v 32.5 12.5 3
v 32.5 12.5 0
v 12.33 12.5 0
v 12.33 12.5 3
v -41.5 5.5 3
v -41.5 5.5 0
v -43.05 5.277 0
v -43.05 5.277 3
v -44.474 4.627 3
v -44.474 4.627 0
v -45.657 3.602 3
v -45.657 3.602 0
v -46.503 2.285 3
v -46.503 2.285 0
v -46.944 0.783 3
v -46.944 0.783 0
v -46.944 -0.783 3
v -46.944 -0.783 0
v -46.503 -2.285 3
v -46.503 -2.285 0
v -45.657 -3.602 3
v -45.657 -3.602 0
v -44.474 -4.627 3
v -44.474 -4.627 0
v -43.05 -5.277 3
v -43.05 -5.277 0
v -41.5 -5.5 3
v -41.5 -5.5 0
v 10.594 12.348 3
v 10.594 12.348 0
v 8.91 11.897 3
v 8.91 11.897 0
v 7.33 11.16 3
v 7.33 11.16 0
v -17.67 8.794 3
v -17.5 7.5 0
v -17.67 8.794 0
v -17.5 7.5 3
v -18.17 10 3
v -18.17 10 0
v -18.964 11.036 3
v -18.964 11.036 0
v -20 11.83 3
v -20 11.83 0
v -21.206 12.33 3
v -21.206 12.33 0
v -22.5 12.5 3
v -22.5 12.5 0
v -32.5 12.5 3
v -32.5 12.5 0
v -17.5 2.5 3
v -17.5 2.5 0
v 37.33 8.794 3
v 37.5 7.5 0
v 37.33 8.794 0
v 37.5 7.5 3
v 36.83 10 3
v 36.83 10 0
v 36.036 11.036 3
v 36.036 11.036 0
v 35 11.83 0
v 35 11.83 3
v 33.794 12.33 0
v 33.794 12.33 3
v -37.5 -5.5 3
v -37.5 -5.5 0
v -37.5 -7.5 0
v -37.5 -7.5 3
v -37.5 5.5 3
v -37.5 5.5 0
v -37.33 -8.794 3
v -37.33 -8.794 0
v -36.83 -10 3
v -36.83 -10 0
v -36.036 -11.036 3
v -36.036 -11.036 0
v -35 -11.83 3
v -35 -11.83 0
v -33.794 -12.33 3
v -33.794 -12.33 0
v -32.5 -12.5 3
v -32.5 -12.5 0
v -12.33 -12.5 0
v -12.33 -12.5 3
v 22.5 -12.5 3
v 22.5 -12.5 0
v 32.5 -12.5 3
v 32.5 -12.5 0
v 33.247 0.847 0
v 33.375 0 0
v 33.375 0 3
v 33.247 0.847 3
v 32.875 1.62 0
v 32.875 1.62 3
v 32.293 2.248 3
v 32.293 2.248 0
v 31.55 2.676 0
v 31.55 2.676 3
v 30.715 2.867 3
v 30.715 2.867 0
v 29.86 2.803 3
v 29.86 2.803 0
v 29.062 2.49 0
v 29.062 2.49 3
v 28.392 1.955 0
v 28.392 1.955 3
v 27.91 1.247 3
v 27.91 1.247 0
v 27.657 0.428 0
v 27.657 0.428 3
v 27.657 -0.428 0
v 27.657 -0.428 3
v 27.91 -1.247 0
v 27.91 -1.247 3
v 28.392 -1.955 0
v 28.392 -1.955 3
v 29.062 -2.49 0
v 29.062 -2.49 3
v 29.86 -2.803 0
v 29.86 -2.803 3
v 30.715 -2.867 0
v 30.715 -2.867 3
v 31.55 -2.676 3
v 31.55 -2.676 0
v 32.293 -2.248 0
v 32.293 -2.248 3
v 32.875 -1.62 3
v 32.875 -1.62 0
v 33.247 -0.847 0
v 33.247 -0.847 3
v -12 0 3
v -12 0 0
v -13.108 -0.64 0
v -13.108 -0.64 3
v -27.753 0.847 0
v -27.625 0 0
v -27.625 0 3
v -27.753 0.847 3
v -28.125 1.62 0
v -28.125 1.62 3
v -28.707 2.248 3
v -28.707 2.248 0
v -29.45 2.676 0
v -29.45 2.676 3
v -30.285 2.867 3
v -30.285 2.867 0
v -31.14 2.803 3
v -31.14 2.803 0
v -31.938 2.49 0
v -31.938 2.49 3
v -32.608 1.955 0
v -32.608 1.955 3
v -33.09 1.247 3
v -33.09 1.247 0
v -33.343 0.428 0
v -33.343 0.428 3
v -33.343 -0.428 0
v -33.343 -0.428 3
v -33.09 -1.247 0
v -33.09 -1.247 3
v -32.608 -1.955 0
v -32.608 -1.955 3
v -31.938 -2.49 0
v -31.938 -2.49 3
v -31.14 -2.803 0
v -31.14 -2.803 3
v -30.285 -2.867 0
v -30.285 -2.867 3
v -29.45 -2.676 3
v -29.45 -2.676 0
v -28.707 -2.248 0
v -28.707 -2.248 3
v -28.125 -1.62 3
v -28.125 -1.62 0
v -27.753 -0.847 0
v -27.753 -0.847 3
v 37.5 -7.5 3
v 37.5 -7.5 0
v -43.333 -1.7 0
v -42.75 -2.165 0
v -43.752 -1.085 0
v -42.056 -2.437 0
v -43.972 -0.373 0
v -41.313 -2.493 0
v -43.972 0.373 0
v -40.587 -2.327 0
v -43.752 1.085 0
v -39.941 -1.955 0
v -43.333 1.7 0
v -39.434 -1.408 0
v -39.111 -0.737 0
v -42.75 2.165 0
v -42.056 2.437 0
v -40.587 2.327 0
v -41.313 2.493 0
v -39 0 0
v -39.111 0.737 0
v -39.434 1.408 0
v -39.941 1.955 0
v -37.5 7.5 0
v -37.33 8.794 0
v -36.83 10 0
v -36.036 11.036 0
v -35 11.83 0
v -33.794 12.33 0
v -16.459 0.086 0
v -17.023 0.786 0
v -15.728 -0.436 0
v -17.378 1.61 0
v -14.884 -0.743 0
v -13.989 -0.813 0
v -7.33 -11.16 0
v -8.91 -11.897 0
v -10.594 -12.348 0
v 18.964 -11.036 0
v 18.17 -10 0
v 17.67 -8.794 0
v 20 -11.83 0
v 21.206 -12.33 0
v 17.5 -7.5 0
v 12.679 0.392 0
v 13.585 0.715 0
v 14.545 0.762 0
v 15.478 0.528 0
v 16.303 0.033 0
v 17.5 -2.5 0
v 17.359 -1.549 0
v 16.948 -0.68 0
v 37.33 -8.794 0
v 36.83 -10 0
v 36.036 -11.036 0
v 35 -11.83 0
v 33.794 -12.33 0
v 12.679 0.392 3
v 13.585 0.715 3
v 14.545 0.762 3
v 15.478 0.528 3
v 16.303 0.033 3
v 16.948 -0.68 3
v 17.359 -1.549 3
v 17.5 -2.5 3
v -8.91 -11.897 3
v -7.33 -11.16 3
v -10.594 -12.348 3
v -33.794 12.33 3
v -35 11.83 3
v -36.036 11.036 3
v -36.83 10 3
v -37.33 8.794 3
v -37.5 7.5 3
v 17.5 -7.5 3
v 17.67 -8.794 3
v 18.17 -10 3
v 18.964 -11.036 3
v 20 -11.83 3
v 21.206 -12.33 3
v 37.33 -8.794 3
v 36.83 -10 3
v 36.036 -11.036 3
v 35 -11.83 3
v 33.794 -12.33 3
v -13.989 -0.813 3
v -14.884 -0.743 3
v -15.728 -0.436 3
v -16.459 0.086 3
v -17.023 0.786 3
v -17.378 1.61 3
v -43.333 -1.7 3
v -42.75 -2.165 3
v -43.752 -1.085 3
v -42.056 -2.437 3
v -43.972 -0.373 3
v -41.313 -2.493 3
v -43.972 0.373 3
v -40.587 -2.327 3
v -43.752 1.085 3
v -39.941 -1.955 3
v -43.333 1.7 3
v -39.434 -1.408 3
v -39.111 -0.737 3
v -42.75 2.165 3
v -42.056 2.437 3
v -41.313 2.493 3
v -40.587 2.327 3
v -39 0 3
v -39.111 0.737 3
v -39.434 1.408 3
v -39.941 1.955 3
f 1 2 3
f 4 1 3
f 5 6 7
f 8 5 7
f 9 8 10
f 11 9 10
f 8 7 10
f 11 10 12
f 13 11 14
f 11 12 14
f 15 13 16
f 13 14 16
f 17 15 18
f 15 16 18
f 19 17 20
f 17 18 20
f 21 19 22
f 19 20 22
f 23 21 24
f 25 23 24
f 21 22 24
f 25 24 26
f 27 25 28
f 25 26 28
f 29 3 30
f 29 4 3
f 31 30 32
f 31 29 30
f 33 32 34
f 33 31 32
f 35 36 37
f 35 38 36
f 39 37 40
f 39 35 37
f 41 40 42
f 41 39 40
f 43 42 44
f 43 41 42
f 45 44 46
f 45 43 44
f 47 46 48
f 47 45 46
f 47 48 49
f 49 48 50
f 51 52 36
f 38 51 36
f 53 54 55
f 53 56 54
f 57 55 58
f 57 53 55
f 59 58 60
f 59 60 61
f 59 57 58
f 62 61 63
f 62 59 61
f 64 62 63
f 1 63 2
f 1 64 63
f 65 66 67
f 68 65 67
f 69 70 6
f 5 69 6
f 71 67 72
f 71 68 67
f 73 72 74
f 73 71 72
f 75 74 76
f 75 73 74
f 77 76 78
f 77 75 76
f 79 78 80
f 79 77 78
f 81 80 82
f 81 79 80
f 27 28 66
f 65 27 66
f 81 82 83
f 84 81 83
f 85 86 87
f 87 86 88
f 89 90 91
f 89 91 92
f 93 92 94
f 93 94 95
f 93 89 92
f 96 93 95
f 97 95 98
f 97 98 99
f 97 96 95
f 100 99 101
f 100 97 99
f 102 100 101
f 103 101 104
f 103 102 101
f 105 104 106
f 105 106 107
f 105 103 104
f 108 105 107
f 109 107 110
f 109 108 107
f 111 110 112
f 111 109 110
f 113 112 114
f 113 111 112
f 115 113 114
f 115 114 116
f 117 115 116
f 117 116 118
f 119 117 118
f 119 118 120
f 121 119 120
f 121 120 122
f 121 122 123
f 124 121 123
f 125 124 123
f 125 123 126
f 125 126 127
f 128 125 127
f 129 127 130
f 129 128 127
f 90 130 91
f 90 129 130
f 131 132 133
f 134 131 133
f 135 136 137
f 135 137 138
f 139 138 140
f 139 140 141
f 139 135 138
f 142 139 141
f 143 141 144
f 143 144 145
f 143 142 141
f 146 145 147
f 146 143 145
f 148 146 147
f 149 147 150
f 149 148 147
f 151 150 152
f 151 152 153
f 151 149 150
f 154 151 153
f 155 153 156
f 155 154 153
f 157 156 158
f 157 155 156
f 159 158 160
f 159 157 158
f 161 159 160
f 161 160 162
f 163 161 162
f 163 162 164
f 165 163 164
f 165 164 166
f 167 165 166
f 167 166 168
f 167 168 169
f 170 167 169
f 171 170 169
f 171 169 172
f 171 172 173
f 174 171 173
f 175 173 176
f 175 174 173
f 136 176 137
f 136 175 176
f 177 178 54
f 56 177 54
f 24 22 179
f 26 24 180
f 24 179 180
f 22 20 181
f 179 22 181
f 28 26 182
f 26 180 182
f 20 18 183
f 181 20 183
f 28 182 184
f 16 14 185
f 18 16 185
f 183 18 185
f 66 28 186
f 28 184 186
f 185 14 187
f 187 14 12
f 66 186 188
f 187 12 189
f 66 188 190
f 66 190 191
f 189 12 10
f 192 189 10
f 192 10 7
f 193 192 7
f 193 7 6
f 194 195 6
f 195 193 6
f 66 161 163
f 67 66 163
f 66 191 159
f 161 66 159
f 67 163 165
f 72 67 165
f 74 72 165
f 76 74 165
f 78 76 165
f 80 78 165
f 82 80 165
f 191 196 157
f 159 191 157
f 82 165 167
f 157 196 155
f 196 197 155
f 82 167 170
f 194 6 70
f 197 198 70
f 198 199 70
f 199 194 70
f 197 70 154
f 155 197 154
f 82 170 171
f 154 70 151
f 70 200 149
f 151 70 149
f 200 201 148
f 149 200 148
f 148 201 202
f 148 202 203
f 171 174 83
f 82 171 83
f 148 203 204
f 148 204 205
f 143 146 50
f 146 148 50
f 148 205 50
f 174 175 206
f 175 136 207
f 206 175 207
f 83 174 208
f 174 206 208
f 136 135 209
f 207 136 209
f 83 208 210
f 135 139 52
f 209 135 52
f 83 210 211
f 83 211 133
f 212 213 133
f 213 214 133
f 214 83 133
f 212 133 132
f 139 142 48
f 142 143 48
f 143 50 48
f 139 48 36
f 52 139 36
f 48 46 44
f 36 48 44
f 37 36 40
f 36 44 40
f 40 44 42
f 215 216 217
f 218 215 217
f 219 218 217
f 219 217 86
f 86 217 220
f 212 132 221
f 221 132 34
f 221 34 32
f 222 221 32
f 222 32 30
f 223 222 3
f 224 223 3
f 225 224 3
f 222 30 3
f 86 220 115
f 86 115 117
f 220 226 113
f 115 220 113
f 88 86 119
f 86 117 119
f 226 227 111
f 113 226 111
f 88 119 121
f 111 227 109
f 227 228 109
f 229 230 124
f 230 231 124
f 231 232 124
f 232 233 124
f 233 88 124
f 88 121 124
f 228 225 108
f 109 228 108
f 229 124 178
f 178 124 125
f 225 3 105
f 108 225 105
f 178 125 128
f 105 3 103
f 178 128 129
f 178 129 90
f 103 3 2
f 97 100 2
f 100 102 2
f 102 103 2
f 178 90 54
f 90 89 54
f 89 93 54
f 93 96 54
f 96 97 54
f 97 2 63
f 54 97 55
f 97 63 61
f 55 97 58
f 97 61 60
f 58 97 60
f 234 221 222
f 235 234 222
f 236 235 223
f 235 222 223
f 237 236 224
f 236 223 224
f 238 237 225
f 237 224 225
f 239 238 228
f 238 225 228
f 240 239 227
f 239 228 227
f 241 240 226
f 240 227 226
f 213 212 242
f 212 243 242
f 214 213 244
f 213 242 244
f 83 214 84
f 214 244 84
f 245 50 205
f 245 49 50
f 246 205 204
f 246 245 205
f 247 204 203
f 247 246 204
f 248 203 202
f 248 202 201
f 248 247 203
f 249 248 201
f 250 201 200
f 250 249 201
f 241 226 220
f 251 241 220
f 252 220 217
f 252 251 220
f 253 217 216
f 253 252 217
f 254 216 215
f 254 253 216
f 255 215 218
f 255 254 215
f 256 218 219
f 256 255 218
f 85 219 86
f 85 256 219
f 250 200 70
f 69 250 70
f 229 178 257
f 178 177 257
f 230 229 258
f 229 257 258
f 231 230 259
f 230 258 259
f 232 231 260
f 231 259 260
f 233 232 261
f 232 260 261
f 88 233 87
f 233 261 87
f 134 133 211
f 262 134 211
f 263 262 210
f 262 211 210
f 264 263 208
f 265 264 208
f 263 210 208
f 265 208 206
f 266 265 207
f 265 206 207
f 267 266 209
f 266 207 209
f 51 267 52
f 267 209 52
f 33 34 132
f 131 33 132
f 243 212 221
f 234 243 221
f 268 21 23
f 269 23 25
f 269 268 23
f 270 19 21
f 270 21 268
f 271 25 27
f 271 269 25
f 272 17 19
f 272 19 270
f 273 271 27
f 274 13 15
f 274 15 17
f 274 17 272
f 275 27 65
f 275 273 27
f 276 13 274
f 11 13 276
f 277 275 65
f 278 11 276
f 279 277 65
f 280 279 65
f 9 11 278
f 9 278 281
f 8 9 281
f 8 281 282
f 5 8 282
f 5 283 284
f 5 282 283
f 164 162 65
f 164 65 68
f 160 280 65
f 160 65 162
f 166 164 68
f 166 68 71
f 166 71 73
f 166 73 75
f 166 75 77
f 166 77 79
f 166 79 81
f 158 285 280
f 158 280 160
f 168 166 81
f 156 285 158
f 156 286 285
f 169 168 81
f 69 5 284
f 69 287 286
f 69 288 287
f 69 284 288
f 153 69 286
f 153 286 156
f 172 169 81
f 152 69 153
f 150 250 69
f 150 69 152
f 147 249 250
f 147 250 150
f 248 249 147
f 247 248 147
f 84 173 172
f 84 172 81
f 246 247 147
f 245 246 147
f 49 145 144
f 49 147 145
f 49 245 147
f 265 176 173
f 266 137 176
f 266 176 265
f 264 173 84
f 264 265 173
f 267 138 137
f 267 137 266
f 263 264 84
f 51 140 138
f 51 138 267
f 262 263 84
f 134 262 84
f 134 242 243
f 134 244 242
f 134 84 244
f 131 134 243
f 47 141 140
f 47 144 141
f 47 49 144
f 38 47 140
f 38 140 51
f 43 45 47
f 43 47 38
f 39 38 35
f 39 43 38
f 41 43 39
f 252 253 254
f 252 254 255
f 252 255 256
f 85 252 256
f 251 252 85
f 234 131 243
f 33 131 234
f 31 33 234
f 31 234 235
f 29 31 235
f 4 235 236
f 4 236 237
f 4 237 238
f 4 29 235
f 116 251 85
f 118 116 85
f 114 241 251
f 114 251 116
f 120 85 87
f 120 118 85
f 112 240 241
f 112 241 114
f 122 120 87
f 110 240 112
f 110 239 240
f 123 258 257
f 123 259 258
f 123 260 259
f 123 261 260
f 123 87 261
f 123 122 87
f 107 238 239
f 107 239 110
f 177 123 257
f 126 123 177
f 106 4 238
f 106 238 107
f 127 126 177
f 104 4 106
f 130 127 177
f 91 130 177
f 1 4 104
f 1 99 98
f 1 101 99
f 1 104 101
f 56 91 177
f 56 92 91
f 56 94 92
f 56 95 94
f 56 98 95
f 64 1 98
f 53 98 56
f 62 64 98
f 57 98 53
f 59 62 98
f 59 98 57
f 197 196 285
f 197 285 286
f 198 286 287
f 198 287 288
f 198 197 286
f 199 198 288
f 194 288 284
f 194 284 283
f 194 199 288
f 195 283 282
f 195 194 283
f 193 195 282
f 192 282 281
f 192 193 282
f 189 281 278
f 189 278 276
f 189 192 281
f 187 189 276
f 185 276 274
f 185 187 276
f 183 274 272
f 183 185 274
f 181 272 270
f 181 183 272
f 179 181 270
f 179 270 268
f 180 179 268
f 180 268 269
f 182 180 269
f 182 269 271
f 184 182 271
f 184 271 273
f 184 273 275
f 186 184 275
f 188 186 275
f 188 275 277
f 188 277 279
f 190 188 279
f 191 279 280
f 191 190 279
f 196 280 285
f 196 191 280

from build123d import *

# Parameters (mm, degrees)
F0_R     = 2.5
F0_R_2   = 2.875
F1_DEPTH = 3
F2_R     = 5
F3_R     = 10


with BuildPart() as f1:
    # F0 (on Top) → F1 (new body)
    with BuildSketch(Plane.XY):
        with BuildLine():
            Line((37.5, -12.5), (37.5, 12.5))
            Line((37.5, 12.5), (9.650635, 12.5))
            Line((9.650635, 12.5), (-12, 0))
            ThreePointArc((-12, 0), (-12.522727, -0.37363), (-13.107664, -0.63951))
            ThreePointArc((-13.107664, -0.63951), (-16.111338, -0.199497), (-17.5, 2.5))
            Line((-17.5, 2.5), (-17.5, 12.5))
            Line((-17.5, 12.5), (-37.5, 12.5))
            Line((-37.5, 12.5), (-37.5, 5.5))
            Line((-37.5, 5.5), (-41.5, 5.5))
            ThreePointArc((-41.5, 5.5), (-47, 0), (-41.5, -5.5))
            Line((-41.5, -5.5), (-37.5, -5.5))
            Line((-37.5, -5.5), (-37.5, -12.5))
            Line((-37.5, -12.5), (-9.650635, -12.5))
            Line((-9.650635, -12.5), (12.679396, 0.392249))
            ThreePointArc((12.679396, 0.392249), (15.908496, 0.310842), (17.5, -2.5))
            Line((17.5, -2.5), (17.5, -12.5))
            Line((17.5, -12.5), (37.5, -12.5))
        make_face()
        with Locations((-41.5, 0)):
            Circle(F0_R, mode=Mode.SUBTRACT)
        with Locations((-30.5, 0)):
            Circle(F0_R_2, mode=Mode.SUBTRACT)
        with Locations((30.5, 0)):
            Circle(F0_R_2, mode=Mode.SUBTRACT)
        with BuildLine():
            ThreePointArc((-13.107664, -0.63951), (-12.522727, -0.37363), (-12, 0))
            Line((-12, 0), (-13.107664, -0.63951))
        make_face()
    extrude(amount=F1_DEPTH)

    # F2
    f2_edges = [f1.edges().sort_by_distance(p)[0] for p in [
        (-17.5, 12.5, 1.5),
        (17.5, -12.5, 1.5),
        (37.5, -12.5, 1.5),
        (37.5, 12.5, 1.5),
        (-37.5, -12.5, 1.5),
        (-37.5, 12.5, 1.5),
    ]]
    fillet(f2_edges, radius=F2_R)

    # F3
    f3_edges = [f1.edges().sort_by_distance(p)[0] for p in [
        (-9.650635, -12.5, 1.5),
        (9.650635, 12.5, 1.5),
    ]]
    fillet(f3_edges, radius=F3_R)


solid = f1.part
